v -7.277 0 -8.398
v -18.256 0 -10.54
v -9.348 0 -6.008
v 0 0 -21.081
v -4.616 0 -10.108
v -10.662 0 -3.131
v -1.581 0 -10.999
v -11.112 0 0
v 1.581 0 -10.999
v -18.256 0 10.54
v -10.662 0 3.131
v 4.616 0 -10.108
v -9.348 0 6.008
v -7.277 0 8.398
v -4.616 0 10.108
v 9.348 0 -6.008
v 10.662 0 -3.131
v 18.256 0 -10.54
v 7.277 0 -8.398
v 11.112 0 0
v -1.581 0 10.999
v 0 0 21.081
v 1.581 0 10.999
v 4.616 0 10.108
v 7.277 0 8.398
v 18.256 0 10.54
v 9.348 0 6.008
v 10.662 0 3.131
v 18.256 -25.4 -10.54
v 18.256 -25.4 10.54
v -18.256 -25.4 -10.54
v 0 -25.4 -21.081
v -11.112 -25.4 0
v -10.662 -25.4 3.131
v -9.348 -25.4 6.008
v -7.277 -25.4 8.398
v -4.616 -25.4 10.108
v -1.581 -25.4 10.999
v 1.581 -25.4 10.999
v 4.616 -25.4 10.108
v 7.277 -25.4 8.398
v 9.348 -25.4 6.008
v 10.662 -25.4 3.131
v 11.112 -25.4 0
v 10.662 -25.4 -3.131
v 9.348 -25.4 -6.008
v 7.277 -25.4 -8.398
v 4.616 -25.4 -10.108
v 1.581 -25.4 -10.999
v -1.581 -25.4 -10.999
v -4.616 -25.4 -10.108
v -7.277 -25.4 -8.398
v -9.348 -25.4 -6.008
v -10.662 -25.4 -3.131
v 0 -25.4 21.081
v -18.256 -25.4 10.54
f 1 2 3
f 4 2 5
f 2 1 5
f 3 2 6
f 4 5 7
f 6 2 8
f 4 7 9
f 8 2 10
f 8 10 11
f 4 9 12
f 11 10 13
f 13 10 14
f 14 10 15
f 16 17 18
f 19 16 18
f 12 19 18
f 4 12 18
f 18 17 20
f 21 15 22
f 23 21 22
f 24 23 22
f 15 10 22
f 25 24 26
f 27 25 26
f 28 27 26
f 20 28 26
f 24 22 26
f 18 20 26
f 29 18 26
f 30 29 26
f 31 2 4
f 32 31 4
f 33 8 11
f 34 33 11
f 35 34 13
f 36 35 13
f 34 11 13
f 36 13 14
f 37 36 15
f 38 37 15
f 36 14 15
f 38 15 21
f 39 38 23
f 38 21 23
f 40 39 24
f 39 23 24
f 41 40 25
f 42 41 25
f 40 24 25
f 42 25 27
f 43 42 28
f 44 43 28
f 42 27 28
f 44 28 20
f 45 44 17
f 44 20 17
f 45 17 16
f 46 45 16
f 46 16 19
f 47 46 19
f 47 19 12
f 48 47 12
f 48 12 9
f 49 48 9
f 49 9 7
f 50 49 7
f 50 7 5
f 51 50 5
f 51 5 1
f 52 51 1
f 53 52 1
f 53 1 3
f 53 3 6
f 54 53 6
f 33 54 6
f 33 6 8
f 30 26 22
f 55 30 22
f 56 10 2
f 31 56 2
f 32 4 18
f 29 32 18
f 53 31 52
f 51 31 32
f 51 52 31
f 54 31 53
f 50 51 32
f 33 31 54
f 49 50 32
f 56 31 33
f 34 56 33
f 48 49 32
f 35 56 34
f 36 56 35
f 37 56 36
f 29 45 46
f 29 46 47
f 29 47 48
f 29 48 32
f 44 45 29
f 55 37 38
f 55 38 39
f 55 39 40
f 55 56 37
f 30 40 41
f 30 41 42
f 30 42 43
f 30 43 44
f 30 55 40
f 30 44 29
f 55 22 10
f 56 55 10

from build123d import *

# Parameters (mm, degrees)
F1_DEPTH = 25.4
F3_D     = 22.225


with BuildPart() as f1:
    # F0 (on Front) → F1 (new body)
    with BuildSketch(Plane.XZ):
        Polygon((18.25625, -10.540251), (18.25625, 10.540251), (0, 21.080502), (-18.25625, 10.540251), (-18.25625, -10.540251), (0, -21.080502), align=None)
    extrude(amount=F1_DEPTH)

    # F3 (through all)
    with Locations(Plane.XZ.offset(25.4)):
        with Locations((0, 0)):
            Hole(F3_D / 2)


solid = f1.part
